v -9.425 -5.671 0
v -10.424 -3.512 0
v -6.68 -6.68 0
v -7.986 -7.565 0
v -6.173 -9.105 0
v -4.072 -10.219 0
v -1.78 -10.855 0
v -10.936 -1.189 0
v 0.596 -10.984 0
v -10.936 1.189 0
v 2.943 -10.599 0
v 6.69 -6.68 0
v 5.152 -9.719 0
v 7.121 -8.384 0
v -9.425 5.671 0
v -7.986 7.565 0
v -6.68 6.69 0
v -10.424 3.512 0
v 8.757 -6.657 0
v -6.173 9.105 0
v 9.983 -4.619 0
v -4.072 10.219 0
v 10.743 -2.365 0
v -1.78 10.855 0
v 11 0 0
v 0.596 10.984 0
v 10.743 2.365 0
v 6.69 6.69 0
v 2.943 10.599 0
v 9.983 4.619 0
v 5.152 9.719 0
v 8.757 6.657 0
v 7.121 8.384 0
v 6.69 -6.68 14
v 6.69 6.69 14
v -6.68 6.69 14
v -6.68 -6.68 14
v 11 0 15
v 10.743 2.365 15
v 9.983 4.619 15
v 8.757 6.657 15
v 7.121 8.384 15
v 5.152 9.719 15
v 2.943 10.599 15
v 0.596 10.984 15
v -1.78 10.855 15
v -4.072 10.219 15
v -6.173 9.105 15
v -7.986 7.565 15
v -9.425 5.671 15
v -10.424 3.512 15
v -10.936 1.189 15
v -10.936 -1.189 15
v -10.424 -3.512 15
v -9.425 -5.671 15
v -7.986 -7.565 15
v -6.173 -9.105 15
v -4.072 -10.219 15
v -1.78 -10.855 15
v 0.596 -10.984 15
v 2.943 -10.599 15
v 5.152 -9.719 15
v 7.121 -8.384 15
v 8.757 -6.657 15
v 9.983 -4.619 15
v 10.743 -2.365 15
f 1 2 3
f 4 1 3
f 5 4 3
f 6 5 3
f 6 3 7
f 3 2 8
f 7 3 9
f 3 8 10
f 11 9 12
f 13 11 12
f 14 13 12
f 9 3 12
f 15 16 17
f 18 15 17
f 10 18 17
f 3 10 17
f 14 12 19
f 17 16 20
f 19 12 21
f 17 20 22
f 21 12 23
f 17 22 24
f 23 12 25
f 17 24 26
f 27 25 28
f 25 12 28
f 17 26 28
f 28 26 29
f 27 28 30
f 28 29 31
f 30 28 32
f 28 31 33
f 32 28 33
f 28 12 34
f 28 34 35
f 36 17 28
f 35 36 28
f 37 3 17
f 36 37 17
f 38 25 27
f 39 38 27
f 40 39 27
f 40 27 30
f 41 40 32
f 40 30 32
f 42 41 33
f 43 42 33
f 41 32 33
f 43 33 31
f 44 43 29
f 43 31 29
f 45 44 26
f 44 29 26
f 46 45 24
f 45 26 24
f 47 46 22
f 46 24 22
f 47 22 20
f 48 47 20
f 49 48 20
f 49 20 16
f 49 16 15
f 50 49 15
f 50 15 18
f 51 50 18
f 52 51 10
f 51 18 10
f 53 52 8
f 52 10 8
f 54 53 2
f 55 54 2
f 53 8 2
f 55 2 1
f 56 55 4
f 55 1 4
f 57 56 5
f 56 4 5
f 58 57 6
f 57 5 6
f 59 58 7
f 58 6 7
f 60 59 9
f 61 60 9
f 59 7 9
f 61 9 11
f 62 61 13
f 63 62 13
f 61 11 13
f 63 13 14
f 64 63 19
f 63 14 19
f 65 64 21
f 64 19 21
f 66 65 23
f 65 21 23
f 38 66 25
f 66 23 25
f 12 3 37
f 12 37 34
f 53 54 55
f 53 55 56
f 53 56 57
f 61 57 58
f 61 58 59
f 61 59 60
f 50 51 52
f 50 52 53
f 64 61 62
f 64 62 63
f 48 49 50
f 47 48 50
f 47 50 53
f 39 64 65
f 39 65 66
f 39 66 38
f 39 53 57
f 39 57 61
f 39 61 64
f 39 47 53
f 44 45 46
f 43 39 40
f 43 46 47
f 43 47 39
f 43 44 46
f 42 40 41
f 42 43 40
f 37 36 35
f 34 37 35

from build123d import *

# Parameters (mm, degrees)
BOX_W          = 13.37
BOX_H          = 13.37
BOX_DEPTH      = 14
CYLINDER_R     = 11
CYLINDER_DEPTH = 15


with BuildPart() as cube:
    # Box → Box (new body)
    with BuildSketch(Plane(origin=(-6.68, -6.68, 0), x_dir=(1, 0, 0), z_dir=(0, 0, 1))):
        with Locations((6.685, 6.685)):
            Rectangle(BOX_W, BOX_H)
    extrude(amount=BOX_DEPTH)


with BuildPart() as cut:
    # Cylinder → Cylinder (new body)
    with BuildSketch(Plane.XY):
        Circle(CYLINDER_R)
    extrude(amount=CYLINDER_DEPTH)

    # Cut: cut Cube
    add(cube.part, mode=Mode.SUBTRACT)


solid = cut.part
